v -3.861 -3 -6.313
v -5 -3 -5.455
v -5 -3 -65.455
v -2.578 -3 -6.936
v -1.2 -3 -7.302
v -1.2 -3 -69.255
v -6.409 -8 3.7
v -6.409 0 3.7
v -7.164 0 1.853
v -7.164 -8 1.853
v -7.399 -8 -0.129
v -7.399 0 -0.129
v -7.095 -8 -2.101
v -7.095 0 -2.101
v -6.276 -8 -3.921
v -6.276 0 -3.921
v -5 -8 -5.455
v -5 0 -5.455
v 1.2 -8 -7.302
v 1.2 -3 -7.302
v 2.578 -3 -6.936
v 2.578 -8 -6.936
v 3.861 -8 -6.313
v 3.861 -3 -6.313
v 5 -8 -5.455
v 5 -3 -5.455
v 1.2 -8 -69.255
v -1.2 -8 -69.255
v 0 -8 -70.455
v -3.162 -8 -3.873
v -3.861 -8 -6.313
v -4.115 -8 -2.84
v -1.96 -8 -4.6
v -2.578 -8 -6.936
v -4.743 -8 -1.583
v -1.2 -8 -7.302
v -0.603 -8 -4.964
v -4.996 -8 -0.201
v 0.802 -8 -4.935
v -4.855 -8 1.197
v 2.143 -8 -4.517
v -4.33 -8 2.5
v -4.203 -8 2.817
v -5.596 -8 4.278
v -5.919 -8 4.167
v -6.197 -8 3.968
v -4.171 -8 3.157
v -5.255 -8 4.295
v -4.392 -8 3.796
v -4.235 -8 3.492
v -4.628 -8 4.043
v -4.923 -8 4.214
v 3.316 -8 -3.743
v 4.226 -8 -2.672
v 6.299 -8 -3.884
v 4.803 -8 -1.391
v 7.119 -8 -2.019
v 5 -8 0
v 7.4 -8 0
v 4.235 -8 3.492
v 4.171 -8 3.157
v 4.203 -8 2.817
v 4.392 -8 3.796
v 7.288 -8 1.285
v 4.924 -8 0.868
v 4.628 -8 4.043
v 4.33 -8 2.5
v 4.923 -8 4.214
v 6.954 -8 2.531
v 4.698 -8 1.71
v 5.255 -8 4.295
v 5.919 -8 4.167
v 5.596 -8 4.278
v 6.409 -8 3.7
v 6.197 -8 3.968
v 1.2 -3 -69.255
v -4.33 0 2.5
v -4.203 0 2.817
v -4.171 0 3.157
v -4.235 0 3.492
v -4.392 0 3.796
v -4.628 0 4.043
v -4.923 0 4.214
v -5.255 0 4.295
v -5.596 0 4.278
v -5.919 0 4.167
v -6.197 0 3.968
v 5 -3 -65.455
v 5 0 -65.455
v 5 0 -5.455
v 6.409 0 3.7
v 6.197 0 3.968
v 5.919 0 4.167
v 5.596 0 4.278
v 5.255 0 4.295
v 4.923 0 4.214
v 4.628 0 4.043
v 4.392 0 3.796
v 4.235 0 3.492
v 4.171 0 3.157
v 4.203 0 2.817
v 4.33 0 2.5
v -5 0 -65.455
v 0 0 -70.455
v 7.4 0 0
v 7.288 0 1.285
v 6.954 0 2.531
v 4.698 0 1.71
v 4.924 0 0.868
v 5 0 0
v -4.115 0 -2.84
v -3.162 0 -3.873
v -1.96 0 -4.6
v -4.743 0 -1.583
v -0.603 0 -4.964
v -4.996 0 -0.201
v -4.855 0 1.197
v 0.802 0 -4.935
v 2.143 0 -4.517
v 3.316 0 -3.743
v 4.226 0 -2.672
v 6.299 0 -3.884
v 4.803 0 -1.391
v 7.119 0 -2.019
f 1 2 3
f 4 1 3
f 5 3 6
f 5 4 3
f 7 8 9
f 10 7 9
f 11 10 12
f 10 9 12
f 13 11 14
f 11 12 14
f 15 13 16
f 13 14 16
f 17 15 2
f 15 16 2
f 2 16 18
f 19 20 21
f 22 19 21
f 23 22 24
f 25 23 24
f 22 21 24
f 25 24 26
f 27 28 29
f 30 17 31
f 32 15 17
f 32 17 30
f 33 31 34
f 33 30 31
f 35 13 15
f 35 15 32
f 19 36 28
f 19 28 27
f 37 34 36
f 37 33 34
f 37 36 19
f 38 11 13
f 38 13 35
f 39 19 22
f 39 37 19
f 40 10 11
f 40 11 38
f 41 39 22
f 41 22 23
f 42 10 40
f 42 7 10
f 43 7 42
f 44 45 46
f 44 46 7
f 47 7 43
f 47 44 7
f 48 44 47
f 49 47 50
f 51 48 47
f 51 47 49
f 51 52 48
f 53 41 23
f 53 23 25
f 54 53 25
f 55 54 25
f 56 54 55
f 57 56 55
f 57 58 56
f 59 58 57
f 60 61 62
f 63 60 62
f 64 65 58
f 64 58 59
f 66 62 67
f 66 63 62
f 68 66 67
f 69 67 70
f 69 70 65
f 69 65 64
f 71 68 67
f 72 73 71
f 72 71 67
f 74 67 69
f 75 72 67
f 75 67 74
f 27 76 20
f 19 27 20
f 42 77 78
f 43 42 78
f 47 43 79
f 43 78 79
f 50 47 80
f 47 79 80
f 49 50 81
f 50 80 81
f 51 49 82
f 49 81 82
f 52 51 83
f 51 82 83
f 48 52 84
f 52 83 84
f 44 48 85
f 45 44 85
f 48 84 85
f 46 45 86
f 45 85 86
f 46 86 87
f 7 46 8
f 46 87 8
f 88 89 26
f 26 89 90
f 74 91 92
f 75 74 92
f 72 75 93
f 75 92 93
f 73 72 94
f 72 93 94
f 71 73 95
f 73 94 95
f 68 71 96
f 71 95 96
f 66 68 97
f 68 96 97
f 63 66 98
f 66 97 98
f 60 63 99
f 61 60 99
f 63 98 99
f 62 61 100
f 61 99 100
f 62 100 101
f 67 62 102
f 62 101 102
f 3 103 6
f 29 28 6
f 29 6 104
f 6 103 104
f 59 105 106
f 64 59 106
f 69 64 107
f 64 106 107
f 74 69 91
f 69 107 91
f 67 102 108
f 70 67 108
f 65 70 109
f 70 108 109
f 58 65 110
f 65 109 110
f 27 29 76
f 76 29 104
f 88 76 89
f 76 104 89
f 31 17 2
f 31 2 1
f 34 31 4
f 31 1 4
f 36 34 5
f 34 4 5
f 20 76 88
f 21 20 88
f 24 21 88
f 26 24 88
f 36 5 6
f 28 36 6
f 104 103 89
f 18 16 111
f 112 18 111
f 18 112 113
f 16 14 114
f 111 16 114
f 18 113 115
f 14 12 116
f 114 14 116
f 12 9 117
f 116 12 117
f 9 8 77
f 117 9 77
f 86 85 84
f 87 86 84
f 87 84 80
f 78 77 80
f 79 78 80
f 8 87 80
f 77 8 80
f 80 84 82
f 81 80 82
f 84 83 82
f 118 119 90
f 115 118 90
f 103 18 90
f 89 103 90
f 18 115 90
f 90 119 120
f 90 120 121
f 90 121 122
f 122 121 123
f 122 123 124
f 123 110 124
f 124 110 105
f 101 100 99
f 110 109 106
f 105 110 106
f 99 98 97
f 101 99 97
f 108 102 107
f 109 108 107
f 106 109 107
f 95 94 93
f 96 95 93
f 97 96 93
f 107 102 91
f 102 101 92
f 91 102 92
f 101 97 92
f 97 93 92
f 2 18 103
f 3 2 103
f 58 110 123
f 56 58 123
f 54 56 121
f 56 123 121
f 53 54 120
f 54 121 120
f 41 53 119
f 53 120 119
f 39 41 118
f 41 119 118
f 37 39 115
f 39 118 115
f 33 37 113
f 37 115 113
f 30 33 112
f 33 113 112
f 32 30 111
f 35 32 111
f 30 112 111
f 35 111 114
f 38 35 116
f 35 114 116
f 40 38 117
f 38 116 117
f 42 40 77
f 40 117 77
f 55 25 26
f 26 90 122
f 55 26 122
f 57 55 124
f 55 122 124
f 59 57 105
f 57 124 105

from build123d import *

# Parameters (mm, degrees)
F1_DEPTH = 8
F2_DEPTH = 3
F3_DEPTH = 8


with BuildPart() as f1:
    # F0 (on Front) → F1 (new body)
    with BuildSketch(Plane.XZ):
        with BuildLine():
            ThreePointArc((4.330127, 2.5), (4.829629, 1.294095), (5, 0))
            ThreePointArc((5, 0), (-1.294095, -4.829629), (-4.330127, 2.5))
            ThreePointArc((-4.330127, 2.5), (-4.769358, 4.13923), (-6.408588, 3.7))
            ThreePointArc((-6.408588, 3.7), (-7.31394, -1.125289), (-5, -5.455273))
            ThreePointArc((-5, -5.455273), (-3.234602, -6.655625), (-1.2, -7.302055))
            ThreePointArc((-1.2, -7.302055), (0, -7.4), (1.2, -7.302055))
            ThreePointArc((1.2, -7.302055), (3.234602, -6.655625), (5, -5.455273))
            ThreePointArc((5, -5.455273), (6.773478, -2.979933), (7.4, 0))
            ThreePointArc((7.4, 0), (7.147851, 1.915261), (6.408588, 3.7))
            ThreePointArc((6.408588, 3.7), (4.769358, 4.13923), (4.330127, 2.5))
        make_face()
    extrude(amount=F1_DEPTH)

    # F0 (on Front) → F2 (join)
    with BuildSketch(Plane.XZ):
        with BuildLine():
            ThreePointArc((-1.2, -7.302055), (-3.234602, -6.655625), (-5, -5.455273))
            Line((-5, -5.455273), (-5, -65.455273))
            Line((-5, -65.455273), (-1.2, -69.255273))
            Line((-1.2, -69.255273), (-1.2, -7.302055))
        make_face()
        with BuildLine():
            Line((5, -65.455273), (5, -5.455273))
            ThreePointArc((5, -5.455273), (3.234602, -6.655625), (1.2, -7.302055))
            Line((1.2, -7.302055), (1.2, -69.255273))
            Line((1.2, -69.255273), (5, -65.455273))
        make_face()
        with BuildLine():
            ThreePointArc((1.2, -7.302055), (0, -7.4), (-1.2, -7.302055))
            Line((-1.2, -7.302055), (-1.2, -69.255273))
            Line((-1.2, -69.255273), (0, -70.455273))
            Line((0, -70.455273), (1.2, -69.255273))
            Line((1.2, -69.255273), (1.2, -7.302055))
        make_face()
    extrude(amount=F2_DEPTH)

    # F0 (on Front) → F3 (join)
    with BuildSketch(Plane.XZ):
        with BuildLine():
            ThreePointArc((1.2, -7.302055), (0, -7.4), (-1.2, -7.302055))
            Line((-1.2, -7.302055), (-1.2, -69.255273))
            Line((-1.2, -69.255273), (0, -70.455273))
            Line((0, -70.455273), (1.2, -69.255273))
            Line((1.2, -69.255273), (1.2, -7.302055))
        make_face()
    extrude(amount=F3_DEPTH)


solid = f1.part
